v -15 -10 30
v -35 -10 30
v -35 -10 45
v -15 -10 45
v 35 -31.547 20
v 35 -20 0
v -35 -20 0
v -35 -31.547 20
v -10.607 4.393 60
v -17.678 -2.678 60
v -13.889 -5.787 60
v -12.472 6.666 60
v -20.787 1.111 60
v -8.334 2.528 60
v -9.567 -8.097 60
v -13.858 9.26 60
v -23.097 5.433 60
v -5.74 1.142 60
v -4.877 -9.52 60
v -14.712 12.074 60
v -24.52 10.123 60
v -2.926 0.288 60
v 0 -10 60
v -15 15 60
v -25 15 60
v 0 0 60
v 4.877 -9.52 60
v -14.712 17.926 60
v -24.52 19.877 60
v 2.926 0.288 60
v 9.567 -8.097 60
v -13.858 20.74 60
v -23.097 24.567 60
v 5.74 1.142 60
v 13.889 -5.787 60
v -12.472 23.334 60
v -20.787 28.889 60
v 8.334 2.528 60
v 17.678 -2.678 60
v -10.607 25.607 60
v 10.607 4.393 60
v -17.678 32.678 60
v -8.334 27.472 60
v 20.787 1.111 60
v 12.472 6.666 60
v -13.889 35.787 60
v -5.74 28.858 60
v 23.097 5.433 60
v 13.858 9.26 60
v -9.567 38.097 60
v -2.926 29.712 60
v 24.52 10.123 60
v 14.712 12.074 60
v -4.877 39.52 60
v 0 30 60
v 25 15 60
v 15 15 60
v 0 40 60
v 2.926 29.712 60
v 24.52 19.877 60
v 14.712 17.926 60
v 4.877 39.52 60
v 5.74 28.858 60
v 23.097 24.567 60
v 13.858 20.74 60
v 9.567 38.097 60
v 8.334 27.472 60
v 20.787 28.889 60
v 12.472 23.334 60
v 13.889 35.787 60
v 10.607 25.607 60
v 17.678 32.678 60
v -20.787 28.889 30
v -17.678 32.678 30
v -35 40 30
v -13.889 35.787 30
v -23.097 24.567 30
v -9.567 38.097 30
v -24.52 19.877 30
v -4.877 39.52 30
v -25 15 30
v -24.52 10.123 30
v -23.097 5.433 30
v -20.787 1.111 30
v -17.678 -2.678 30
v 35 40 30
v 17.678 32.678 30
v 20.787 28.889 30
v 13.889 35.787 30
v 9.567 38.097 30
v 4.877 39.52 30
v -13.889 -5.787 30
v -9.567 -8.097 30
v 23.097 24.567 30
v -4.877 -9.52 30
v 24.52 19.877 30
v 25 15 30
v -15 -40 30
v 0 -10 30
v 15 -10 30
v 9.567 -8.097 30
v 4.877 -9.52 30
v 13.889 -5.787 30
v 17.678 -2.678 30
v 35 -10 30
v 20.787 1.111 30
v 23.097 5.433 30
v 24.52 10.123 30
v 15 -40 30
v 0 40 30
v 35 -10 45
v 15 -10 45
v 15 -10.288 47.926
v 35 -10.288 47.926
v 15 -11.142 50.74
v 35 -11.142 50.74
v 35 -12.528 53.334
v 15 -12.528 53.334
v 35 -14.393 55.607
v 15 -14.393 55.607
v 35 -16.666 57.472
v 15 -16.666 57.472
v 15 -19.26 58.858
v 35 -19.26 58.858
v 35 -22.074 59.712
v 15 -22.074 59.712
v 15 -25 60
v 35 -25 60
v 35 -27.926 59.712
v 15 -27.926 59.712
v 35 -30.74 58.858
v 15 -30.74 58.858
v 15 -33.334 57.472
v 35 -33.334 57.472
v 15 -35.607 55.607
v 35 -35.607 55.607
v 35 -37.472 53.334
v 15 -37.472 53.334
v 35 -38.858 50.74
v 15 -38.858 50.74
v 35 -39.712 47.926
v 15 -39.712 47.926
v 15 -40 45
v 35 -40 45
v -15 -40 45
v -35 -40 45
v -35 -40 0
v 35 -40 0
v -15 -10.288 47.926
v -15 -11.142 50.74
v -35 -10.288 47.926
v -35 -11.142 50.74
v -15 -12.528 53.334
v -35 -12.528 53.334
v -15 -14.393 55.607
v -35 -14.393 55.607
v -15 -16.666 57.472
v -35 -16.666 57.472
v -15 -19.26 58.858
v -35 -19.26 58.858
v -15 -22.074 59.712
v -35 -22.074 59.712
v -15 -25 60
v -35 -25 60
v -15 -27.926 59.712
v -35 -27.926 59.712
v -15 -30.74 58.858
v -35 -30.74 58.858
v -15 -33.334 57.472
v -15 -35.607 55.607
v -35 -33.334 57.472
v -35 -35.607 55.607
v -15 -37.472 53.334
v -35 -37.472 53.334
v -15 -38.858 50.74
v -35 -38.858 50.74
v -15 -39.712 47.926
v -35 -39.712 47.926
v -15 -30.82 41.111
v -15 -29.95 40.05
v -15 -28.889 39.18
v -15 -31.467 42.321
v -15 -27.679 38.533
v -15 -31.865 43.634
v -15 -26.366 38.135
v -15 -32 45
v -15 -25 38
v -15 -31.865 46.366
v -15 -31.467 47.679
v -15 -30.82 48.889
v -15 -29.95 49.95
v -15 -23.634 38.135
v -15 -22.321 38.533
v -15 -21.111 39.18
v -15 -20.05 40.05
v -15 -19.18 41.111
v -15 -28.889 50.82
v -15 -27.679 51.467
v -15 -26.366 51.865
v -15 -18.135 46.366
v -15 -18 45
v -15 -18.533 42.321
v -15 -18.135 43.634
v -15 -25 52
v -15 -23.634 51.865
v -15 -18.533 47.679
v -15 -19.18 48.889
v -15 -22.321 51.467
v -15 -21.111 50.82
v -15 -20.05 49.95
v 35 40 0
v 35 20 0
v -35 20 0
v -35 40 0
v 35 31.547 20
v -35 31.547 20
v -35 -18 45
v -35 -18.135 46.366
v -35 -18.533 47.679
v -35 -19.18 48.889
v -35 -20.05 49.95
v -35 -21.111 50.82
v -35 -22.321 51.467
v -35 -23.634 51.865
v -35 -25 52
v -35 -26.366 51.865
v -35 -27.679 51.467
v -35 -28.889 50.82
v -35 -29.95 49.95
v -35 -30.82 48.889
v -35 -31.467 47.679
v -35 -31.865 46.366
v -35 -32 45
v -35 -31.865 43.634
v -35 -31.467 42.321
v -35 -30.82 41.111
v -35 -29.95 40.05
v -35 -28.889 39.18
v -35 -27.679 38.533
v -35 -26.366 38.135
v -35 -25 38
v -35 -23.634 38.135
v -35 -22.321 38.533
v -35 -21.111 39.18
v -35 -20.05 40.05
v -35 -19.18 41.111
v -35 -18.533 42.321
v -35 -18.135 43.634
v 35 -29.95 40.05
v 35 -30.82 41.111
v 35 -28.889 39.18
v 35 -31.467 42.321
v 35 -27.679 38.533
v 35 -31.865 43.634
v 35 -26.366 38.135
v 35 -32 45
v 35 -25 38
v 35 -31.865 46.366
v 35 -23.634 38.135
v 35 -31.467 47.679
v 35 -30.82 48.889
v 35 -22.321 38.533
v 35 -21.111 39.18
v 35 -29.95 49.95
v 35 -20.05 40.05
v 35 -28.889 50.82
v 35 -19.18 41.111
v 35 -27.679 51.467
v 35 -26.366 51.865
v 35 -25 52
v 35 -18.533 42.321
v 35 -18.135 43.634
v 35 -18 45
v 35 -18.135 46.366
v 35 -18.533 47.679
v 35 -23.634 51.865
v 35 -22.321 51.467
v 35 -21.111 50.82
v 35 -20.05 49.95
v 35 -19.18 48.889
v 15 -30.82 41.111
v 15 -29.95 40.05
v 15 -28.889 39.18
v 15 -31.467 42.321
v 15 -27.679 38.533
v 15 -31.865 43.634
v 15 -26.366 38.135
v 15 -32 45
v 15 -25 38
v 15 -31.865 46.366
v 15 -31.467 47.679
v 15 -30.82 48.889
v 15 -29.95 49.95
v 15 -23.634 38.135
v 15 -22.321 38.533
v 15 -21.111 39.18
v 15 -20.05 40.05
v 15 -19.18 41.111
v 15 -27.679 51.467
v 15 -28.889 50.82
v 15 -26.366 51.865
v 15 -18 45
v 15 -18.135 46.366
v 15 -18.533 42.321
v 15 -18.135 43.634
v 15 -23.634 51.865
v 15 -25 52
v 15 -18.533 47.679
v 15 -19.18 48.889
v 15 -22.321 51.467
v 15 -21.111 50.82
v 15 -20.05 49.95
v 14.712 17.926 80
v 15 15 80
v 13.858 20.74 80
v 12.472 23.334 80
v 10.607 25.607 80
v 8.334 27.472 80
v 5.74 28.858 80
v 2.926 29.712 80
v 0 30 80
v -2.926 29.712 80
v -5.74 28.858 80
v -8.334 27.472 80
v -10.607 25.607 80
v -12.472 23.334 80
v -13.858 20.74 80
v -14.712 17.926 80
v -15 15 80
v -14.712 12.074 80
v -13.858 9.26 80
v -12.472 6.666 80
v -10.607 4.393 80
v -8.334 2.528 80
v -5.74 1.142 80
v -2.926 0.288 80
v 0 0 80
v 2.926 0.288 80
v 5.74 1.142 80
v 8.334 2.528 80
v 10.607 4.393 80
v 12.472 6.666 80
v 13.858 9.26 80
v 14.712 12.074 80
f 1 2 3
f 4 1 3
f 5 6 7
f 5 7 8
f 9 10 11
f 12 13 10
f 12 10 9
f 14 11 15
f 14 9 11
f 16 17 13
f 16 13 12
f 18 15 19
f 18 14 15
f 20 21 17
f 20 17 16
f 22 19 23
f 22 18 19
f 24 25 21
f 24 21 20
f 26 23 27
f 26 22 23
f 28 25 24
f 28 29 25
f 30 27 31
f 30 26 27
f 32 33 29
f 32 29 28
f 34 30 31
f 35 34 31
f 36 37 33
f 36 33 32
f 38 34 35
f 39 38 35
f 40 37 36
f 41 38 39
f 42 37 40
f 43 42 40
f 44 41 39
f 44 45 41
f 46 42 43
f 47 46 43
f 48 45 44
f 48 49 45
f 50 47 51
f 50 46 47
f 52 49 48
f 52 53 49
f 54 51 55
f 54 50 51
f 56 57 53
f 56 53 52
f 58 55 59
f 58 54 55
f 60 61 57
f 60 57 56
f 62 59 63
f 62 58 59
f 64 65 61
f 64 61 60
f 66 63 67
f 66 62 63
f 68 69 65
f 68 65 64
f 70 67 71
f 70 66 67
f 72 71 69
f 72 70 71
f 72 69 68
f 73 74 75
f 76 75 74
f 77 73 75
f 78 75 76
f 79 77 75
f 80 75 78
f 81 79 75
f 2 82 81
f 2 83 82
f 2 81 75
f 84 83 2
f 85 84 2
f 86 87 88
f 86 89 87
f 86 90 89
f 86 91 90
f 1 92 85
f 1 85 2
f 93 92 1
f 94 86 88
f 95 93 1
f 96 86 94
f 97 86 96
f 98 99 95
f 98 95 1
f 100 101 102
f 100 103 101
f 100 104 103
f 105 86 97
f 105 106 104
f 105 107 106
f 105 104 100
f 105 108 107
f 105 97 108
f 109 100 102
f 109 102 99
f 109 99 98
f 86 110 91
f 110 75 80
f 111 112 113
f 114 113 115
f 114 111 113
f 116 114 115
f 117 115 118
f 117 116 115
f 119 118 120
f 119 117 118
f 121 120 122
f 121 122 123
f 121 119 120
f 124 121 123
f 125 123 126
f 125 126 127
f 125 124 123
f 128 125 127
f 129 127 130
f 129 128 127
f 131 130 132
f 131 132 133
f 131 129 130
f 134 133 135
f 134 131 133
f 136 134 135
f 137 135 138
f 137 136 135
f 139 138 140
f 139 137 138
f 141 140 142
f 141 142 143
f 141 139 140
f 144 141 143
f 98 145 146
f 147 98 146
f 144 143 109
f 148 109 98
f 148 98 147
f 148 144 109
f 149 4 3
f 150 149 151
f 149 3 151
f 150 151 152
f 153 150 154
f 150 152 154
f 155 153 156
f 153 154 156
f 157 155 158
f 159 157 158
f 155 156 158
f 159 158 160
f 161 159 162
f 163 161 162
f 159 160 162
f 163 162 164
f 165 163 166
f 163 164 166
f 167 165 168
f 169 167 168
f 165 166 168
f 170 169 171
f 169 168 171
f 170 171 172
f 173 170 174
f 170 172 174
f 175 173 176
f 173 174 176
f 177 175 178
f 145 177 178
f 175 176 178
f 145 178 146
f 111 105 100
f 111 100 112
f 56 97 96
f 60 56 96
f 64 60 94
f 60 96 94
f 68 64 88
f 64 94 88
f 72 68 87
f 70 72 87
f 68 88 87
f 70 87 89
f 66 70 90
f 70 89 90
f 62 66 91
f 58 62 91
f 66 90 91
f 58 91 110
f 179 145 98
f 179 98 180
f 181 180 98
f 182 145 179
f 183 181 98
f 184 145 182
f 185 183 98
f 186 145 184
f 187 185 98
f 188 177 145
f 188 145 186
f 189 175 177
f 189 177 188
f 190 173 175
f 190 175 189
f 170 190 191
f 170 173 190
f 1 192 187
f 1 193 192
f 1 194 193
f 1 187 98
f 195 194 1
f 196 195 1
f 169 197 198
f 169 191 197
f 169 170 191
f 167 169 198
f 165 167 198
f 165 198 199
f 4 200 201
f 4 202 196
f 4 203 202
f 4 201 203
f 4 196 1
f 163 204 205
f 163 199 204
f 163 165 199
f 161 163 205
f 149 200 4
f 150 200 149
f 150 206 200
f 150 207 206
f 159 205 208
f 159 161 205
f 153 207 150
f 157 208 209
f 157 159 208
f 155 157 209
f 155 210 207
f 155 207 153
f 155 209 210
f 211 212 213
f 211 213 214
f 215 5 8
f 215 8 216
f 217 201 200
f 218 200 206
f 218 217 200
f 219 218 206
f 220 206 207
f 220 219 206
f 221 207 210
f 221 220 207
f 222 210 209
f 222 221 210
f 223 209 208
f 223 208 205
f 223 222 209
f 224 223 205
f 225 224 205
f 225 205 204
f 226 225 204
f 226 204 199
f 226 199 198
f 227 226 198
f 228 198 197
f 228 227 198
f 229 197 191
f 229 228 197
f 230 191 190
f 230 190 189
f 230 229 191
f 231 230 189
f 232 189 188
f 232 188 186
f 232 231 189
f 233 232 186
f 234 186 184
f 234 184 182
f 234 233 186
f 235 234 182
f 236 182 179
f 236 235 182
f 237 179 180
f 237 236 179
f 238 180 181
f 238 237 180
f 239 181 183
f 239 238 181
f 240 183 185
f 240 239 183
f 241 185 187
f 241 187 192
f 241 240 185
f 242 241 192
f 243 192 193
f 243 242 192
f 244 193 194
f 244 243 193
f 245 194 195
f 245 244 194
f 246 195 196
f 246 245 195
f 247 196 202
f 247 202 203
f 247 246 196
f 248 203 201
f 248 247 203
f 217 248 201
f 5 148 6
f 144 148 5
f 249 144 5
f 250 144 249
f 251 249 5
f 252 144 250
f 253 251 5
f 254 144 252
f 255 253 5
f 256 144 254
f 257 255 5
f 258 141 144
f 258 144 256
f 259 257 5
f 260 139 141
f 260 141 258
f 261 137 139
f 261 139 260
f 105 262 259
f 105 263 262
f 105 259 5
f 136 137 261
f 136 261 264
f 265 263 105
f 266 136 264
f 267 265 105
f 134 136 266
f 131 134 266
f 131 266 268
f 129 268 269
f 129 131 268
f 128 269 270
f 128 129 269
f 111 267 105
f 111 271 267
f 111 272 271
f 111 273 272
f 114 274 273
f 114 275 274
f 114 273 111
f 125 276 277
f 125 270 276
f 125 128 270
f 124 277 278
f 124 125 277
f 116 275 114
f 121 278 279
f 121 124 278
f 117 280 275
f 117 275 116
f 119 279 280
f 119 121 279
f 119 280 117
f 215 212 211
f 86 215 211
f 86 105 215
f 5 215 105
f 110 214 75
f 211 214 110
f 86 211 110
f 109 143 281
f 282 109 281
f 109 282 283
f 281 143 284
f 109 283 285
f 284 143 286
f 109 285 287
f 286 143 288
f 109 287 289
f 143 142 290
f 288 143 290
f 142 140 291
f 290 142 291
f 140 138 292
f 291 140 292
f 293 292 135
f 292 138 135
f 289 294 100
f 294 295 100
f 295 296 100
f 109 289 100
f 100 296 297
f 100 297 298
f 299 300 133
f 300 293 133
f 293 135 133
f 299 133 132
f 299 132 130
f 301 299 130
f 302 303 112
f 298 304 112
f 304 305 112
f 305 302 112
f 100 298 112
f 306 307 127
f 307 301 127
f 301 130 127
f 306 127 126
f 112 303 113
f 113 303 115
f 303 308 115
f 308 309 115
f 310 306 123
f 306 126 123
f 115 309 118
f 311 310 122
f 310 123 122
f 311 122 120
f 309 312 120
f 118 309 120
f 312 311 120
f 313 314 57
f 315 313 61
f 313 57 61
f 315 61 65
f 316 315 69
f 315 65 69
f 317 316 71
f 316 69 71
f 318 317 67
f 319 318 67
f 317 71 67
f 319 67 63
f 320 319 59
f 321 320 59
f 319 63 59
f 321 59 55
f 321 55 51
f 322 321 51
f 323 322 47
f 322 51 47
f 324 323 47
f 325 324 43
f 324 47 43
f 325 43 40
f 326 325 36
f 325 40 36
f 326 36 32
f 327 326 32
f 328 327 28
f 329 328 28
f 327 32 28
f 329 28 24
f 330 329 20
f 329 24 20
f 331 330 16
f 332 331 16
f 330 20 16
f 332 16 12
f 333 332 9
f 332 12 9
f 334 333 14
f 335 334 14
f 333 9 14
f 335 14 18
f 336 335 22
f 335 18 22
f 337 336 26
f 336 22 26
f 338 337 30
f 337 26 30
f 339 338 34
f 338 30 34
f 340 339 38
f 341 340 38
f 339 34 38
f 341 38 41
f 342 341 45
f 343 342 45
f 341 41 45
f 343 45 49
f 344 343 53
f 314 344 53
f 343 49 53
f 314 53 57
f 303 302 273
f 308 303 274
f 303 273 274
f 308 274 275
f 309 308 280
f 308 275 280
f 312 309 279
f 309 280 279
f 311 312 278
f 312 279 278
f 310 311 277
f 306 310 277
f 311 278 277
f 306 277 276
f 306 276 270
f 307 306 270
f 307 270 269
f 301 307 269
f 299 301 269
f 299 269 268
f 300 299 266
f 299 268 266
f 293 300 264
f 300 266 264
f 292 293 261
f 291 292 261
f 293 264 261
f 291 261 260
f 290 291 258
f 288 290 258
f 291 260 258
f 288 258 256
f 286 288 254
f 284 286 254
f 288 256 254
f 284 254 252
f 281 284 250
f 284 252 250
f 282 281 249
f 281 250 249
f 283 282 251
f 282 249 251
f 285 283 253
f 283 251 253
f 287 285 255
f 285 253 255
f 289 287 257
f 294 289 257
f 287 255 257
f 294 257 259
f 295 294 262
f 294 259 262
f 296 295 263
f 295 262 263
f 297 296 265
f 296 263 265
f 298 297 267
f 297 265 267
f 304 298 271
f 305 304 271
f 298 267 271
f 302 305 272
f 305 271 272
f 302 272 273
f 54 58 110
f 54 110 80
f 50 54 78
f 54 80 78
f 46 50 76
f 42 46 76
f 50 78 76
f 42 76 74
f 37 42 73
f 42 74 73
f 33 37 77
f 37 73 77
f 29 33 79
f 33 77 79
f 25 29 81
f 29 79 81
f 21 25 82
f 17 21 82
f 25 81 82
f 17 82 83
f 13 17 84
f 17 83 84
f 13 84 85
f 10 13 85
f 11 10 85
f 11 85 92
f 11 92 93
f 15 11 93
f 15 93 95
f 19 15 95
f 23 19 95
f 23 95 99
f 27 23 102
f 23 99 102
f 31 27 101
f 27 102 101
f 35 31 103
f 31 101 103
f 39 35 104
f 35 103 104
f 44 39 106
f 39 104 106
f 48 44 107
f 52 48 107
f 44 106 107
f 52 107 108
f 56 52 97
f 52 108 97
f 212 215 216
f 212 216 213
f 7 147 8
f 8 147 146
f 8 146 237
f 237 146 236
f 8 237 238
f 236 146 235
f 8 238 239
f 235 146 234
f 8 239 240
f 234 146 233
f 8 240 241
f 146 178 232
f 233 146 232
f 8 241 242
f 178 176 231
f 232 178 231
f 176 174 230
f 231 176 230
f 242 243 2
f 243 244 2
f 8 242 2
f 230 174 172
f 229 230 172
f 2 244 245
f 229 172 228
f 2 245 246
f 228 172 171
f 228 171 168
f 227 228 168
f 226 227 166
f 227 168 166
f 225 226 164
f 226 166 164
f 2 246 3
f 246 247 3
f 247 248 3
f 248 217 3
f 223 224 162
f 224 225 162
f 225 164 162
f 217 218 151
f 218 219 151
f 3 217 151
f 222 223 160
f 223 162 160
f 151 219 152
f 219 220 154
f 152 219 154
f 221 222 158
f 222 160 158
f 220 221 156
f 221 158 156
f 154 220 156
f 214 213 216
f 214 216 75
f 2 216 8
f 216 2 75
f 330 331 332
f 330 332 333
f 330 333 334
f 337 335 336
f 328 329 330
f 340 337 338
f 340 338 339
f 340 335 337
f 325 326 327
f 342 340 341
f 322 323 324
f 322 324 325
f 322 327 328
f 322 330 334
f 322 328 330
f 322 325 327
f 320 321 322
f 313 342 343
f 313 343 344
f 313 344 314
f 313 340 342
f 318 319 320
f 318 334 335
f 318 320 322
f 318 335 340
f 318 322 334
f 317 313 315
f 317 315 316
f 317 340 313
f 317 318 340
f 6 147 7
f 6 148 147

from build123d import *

# Parameters (mm, degrees)
F1_DEPTH = 35
F2_R     = 7
F3_DEPTH = 20
F6_DEPTH = 30
F7_R     = 15
F8_DEPTH = 20


with BuildPart() as f1:
    # F0 (on Right) → F1 (new body, symmetric)
    with BuildSketch(Plane.YZ):
        Polygon((-40, 0), (-20, 0), (-31.5470053838, 20), (31.5470053838, 20), (20, 0), (40, 0), (40, 30), (-40, 30), align=None)
    extrude(amount=F1_DEPTH, both=True)

    # F2 (on face) → F3 (join)
    with BuildSketch(Plane.YZ.offset(35)):
        with BuildLine():
            Line((-10, 30), (-10, 45))
            ThreePointArc((-10, 45), (-25, 60), (-40, 45))
            Line((-40, 45), (-40, 30))
            Line((-40, 30), (-10, 30))
        make_face()
        with Locations((-25, 45)):
            Circle(F2_R, mode=Mode.SUBTRACT)
    extrude(amount=-F3_DEPTH)

    # F4: F1 across plane


with BuildPart() as f1_1:
    add(f1.part)
    add(f1.part.mirror(Plane.YZ))

    # F5 (on face) → F6 (join)
    with BuildSketch(Plane.XY.offset(30)):
        with BuildLine():
            ThreePointArc((3.22e-08, 40), (-17.6776695411, -2.6776695183), (25, 15))
            ThreePointArc((25, 15), (17.6776695411, 32.6776695183), (3.22e-08, 40))
        make_face()
    extrude(amount=F6_DEPTH)

    # F7 (on face) → F8 (join)
    with BuildSketch(Plane.XY.offset(60)):
        with Locations((0, 15)):
            Circle(F7_R)
    extrude(amount=F8_DEPTH)


solid = f1_1.part
